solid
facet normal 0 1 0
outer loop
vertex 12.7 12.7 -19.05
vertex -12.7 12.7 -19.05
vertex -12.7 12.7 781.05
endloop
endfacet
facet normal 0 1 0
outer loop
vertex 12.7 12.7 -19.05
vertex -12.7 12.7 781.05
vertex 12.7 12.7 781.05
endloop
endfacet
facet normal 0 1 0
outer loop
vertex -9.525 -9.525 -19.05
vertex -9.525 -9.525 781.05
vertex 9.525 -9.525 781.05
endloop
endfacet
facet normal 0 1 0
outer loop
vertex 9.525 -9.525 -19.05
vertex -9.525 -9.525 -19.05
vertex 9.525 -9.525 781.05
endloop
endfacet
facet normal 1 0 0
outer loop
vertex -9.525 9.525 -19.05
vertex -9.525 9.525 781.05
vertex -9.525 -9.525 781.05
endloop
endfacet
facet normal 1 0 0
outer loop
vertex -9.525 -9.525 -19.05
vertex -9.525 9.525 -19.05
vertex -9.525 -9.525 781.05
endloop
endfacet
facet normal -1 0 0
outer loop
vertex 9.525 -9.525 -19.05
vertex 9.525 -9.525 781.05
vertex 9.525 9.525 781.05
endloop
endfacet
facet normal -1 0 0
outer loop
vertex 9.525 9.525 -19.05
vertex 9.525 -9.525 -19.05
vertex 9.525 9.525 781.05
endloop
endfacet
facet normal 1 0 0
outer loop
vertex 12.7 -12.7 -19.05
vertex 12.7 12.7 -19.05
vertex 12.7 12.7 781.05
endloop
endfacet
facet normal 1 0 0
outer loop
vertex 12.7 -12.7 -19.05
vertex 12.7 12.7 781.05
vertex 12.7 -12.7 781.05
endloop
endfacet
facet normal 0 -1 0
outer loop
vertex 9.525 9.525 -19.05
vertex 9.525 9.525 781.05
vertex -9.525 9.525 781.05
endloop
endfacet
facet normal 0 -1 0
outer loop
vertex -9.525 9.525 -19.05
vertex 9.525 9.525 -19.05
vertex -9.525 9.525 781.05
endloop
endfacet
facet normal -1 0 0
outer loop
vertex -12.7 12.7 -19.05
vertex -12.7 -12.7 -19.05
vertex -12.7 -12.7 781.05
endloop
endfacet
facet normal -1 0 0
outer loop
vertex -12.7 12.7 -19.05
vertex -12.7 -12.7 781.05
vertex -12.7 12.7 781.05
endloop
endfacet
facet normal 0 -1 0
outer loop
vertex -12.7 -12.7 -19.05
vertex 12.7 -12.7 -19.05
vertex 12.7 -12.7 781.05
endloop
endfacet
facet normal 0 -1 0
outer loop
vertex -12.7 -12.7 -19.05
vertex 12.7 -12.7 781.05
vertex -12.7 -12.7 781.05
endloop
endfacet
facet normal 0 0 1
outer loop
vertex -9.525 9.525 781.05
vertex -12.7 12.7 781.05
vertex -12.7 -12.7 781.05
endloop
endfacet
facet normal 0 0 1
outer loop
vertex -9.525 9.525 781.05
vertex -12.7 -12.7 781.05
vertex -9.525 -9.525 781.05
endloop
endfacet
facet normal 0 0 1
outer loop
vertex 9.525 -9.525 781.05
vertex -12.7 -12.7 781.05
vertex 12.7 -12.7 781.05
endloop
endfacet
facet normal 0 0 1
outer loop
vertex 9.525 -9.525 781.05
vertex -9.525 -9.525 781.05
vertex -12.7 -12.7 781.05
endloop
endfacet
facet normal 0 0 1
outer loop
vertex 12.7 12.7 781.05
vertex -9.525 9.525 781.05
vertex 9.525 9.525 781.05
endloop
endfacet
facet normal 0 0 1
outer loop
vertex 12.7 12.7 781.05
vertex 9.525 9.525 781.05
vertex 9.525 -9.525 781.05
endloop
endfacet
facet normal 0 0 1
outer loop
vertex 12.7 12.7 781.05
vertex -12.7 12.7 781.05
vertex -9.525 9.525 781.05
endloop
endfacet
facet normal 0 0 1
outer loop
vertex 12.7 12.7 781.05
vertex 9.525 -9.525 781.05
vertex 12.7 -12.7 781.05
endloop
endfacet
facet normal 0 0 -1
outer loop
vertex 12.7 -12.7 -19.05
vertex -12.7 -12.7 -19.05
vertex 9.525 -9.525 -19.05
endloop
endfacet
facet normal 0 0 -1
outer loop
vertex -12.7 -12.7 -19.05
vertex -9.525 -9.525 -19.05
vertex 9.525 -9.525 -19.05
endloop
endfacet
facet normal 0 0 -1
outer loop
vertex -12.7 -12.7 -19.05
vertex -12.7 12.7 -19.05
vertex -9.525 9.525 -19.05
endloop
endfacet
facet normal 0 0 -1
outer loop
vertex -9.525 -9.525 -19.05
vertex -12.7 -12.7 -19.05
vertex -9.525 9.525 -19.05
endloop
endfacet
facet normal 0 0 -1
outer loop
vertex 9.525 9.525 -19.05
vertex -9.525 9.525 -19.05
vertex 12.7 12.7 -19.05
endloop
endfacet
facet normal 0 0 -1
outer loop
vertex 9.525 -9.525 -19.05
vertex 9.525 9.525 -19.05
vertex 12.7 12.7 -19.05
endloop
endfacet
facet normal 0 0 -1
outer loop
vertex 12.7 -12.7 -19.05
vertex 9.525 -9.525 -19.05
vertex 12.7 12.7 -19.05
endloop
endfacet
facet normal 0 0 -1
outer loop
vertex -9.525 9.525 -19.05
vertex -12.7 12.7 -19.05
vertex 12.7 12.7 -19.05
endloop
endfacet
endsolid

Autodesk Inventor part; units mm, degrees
ref_plane "Start Plane" through (0, 0, -19.05) normal (0, 0, 1) x (1, 0, 0)
ref_plane "End Plane" through (0, 0, 781.05) normal (0, 0, 1) x (1, 0, 0)
sketch "Sketch" plane through (0, 0, 0) normal (0, 0, 1) x (1, 0, 0)
  line L0 (-12.7, 12.7) -> (12.7, 12.7)
  line L1 (12.7, 12.7) -> (12.7, -12.7)
  line L2 (12.7, -12.7) -> (-12.7, -12.7)
  line L3 (-12.7, -12.7) -> (-12.7, 12.7)
  line L4 (9.525, 9.525) -> (-9.525, 9.525)
  line L5 (-9.525, 9.525) -> (-9.525, -9.525)
  line L6 (-9.525, -9.525) -> (9.525, -9.525)
  line L7 (9.525, -9.525) -> (9.525, 9.525)
  point P0 (0, 0)
  point P1 (0, 12.7)
  point P2 (-12.7, 0)
  dimension "width" = 25.4
  dimension "d1" = 3.175
extrude "Body" add sketch "Sketch" along normal up to surface (800.1 mm away) from surface at -19.05
sketch "Sketch4" plane through (0, 0, 0) normal (0, 0, 1) x (1, 0, 0)
  line L0 (0, 0) -> (10, 0)
ref_plane "Work Plane4" through (0, 0, 0) normal (0, -1, 0) x (1, 0, 0)
sketch "Sketch5" plane through (0, 0, 0) normal (0, -1, 0) x (1, 0, 0)
  line L0 (-2, -19.05) -> (12, -19.05)
  line L1 (-2, 781.05) -> (12, 781.05)
  dimension "d9" = 800.1
ref_plane "Work Plane5" through (-50.8, 0, 781.05) normal (0, 0, 1) x (1, 0, 0)
split "Split1" plane through (-50.8, 0, 781.05) removes the side toward (0, 0, 1)
ref_plane "Work Plane6" through (-12.7, 0, -19.05) normal (0, 0, -1) x (-1, 0, 0)
split "Split2" plane through (-12.7, 0, -19.05) removes the side toward (0, 0, -1)
equation "\"G_OFFSET_START\" = 19.05"
equation "\"G_OFFSET_END\" = 19.05"
equation "\"d4\" = -G_OFFSET_START"
equation "\"d5\" = length + G_OFFSET_END"
equation "\"G_L\" = 762"
equation "\"length\" = 762"
properties part number "Square Tube Profile" material "Aluminum-6061"
